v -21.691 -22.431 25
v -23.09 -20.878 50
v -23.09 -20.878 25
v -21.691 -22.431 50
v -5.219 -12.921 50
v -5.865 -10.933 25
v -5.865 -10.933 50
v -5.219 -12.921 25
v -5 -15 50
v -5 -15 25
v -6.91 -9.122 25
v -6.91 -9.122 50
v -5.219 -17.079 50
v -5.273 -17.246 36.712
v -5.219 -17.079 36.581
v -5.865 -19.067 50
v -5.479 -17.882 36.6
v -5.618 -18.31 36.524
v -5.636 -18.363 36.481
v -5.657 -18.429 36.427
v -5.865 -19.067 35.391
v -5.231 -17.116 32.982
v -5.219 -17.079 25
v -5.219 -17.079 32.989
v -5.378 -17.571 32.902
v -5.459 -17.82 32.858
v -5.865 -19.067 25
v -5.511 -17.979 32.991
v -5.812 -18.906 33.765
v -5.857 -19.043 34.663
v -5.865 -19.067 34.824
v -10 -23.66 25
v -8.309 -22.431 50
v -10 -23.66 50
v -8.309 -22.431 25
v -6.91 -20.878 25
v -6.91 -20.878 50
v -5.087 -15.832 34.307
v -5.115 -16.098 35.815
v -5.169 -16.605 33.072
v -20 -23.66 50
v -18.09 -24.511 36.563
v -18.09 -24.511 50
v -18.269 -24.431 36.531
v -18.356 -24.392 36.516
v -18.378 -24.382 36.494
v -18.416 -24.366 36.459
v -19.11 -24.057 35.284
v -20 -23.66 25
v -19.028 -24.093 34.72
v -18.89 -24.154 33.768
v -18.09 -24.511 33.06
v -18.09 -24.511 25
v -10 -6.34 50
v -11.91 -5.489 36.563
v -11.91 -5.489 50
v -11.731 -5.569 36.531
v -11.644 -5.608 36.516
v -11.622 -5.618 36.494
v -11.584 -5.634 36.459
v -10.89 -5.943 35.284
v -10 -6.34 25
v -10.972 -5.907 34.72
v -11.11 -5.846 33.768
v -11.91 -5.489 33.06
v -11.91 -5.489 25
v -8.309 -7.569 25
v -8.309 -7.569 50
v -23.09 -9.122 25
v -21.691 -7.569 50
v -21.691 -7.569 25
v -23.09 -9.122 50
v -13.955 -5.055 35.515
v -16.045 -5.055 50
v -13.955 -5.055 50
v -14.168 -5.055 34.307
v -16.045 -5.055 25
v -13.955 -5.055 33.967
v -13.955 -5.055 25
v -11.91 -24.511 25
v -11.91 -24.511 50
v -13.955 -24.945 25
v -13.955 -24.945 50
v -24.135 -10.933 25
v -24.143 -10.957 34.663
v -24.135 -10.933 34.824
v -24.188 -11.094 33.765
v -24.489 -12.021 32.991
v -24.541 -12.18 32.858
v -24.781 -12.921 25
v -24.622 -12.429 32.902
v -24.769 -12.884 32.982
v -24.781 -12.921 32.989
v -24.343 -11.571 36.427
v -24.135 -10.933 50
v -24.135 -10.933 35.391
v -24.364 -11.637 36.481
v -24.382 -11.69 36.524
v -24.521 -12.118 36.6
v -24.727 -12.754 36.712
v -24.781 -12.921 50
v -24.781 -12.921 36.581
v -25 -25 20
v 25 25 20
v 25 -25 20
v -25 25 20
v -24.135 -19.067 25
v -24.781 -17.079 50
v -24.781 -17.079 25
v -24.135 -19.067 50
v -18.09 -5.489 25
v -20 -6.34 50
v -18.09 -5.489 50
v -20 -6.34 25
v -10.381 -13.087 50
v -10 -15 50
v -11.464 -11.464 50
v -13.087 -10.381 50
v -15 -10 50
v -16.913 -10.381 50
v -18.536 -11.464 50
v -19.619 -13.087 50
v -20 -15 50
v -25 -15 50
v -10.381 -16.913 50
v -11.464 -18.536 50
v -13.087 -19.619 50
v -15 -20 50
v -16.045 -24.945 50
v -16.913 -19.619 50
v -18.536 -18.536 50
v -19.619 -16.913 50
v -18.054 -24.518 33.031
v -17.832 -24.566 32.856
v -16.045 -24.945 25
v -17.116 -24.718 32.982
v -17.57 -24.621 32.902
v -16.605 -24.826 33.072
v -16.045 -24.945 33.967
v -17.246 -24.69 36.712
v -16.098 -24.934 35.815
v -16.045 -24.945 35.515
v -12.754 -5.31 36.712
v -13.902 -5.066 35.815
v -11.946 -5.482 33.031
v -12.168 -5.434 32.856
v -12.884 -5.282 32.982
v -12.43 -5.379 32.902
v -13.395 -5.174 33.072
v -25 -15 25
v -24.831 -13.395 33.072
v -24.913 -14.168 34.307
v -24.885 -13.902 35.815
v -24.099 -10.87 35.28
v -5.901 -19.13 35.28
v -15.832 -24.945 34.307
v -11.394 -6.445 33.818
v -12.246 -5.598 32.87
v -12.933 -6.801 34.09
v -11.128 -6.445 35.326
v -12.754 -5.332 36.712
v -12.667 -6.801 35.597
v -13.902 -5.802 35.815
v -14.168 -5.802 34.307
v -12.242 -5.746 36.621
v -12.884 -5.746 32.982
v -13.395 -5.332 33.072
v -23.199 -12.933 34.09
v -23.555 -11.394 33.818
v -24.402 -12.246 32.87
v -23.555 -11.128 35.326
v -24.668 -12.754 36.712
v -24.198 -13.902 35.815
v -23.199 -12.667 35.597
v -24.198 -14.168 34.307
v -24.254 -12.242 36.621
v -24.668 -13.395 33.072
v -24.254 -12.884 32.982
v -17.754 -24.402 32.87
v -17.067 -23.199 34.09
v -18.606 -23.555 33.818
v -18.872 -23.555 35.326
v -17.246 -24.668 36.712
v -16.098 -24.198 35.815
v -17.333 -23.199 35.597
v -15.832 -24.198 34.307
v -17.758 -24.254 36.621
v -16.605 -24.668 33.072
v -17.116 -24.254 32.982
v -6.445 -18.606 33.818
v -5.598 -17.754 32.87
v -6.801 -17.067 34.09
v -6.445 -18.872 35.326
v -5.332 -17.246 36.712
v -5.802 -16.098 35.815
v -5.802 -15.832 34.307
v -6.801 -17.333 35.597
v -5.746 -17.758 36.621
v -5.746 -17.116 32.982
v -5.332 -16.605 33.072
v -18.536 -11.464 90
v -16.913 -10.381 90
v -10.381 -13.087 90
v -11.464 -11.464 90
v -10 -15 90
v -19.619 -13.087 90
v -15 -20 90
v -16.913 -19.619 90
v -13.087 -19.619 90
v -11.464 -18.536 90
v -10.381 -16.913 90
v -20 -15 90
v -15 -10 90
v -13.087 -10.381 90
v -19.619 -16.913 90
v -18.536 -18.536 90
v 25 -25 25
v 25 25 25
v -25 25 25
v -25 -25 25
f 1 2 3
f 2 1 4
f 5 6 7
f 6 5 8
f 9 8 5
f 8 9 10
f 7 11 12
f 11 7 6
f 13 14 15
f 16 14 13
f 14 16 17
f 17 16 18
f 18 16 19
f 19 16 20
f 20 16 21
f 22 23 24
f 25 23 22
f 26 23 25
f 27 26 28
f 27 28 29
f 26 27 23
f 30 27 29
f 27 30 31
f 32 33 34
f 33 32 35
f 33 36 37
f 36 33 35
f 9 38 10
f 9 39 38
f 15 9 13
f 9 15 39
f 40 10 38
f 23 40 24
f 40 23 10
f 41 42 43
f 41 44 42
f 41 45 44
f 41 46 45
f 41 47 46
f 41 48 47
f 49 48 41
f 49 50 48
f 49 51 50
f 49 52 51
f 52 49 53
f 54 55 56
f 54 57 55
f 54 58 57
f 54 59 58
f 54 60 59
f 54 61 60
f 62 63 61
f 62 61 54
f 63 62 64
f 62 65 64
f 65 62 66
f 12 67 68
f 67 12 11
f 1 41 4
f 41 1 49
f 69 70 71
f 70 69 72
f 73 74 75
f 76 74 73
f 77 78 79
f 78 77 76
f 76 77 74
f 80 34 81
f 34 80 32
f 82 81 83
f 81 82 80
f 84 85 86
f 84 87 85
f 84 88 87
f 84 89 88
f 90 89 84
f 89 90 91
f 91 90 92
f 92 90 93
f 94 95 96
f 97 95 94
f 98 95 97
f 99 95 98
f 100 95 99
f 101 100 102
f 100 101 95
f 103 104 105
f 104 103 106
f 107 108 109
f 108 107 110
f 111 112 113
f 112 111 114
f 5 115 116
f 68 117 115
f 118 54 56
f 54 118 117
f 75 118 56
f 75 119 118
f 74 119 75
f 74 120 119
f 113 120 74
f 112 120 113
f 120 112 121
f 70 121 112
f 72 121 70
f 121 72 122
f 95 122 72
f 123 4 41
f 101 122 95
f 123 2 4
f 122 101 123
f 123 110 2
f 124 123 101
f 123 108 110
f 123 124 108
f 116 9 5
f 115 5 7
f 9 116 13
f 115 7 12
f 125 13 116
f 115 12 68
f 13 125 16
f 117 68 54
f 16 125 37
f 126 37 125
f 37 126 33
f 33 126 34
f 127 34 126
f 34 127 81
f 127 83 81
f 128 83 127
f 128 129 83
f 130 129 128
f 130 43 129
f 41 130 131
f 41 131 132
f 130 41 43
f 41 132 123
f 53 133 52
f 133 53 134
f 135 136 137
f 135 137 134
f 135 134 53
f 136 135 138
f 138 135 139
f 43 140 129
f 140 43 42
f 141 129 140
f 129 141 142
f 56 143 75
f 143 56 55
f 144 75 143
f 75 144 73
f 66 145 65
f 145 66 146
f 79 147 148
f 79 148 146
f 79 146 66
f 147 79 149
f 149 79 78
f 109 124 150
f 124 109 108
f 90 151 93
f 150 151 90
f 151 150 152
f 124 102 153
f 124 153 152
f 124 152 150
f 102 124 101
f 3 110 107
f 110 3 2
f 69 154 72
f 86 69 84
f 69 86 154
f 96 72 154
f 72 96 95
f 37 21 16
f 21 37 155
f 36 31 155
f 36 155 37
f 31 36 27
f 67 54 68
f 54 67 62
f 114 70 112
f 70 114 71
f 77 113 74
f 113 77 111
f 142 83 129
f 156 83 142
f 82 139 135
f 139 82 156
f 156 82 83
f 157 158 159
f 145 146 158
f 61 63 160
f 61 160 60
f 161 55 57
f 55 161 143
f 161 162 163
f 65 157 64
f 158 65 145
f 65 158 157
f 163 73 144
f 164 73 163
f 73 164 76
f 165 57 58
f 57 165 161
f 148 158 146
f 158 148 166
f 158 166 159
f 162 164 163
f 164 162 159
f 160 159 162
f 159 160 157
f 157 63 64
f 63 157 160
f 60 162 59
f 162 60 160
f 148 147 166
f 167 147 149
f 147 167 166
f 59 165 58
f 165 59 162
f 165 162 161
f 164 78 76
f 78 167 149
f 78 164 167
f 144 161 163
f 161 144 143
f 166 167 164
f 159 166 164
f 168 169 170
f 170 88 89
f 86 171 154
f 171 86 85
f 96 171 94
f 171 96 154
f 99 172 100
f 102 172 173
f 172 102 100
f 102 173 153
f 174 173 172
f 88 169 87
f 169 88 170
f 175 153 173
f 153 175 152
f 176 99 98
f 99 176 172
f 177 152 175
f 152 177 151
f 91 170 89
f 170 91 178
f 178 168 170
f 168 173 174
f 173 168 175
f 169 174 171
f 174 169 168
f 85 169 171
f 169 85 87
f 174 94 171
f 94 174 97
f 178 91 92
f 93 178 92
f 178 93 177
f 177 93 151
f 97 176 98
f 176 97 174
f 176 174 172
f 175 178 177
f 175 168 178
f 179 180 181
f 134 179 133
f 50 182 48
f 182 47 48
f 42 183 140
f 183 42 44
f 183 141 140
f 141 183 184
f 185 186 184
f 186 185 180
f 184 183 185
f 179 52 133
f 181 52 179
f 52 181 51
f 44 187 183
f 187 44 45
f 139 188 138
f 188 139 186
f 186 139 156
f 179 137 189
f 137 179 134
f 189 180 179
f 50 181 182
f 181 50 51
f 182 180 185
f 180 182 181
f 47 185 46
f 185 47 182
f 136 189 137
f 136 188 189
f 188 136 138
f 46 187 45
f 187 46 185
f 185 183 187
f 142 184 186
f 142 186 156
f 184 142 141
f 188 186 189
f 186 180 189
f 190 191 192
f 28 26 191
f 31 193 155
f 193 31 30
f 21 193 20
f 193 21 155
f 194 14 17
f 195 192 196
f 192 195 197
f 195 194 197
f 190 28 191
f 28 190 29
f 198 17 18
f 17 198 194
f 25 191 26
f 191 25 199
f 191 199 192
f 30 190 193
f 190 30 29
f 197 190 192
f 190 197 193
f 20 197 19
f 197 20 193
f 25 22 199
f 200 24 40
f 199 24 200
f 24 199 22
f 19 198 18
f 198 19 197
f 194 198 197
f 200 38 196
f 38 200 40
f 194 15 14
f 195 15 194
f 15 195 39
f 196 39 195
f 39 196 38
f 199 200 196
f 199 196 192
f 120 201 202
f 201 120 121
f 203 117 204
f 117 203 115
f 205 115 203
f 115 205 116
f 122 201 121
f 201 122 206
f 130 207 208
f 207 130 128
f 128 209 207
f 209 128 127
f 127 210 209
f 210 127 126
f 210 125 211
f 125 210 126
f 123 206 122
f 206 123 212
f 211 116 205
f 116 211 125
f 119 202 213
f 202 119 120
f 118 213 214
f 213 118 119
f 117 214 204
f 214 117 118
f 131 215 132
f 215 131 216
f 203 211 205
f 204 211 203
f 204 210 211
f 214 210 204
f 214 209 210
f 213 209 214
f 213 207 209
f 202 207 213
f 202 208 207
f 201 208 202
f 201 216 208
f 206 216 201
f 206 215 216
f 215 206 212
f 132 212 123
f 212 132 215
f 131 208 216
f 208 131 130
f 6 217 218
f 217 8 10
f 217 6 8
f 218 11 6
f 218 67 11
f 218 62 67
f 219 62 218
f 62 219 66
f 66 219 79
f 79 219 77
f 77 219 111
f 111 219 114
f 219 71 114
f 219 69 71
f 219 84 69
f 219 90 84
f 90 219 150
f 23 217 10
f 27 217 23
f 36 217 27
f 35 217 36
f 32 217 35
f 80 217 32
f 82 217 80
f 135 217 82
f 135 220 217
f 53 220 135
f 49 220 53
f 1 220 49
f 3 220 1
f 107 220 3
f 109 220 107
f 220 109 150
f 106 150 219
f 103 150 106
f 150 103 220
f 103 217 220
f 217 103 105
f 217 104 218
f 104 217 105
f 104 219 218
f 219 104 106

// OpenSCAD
union()  {
translate([-25.0,-25.0,20.0])cube([50.0,50.0,5.0]);
translate([0.0,0.0,0.0])scale([1.0,1.0,1.0])cube([0.0,0.0,0.0]);
union()  {
translate([-25.0,-25.0,20.0])cube([20.0,20.0,5.0]);
translate([-15.0,-15.0,20.0])scale([1.0,1.0,1.0])union()  {
difference()  {
cylinder(r=10.0,h=30.0);
rotate([0.0,10.0,0.0])  translate([0.0,10.0,15.0])sphere(r = 2.0);
rotate([0.0,10.0,90.0])  translate([0.0,10.0,15.0])sphere(r = 2.0);
rotate([0.0,10.0,180.0])  translate([0.0,10.0,15.0])sphere(r = 2.0);
rotate([0.0,10.0,270.0])  translate([0.0,10.0,15.0])sphere(r = 2.0);
}
cylinder(r=5.0,h=70.0);
}
}
}
